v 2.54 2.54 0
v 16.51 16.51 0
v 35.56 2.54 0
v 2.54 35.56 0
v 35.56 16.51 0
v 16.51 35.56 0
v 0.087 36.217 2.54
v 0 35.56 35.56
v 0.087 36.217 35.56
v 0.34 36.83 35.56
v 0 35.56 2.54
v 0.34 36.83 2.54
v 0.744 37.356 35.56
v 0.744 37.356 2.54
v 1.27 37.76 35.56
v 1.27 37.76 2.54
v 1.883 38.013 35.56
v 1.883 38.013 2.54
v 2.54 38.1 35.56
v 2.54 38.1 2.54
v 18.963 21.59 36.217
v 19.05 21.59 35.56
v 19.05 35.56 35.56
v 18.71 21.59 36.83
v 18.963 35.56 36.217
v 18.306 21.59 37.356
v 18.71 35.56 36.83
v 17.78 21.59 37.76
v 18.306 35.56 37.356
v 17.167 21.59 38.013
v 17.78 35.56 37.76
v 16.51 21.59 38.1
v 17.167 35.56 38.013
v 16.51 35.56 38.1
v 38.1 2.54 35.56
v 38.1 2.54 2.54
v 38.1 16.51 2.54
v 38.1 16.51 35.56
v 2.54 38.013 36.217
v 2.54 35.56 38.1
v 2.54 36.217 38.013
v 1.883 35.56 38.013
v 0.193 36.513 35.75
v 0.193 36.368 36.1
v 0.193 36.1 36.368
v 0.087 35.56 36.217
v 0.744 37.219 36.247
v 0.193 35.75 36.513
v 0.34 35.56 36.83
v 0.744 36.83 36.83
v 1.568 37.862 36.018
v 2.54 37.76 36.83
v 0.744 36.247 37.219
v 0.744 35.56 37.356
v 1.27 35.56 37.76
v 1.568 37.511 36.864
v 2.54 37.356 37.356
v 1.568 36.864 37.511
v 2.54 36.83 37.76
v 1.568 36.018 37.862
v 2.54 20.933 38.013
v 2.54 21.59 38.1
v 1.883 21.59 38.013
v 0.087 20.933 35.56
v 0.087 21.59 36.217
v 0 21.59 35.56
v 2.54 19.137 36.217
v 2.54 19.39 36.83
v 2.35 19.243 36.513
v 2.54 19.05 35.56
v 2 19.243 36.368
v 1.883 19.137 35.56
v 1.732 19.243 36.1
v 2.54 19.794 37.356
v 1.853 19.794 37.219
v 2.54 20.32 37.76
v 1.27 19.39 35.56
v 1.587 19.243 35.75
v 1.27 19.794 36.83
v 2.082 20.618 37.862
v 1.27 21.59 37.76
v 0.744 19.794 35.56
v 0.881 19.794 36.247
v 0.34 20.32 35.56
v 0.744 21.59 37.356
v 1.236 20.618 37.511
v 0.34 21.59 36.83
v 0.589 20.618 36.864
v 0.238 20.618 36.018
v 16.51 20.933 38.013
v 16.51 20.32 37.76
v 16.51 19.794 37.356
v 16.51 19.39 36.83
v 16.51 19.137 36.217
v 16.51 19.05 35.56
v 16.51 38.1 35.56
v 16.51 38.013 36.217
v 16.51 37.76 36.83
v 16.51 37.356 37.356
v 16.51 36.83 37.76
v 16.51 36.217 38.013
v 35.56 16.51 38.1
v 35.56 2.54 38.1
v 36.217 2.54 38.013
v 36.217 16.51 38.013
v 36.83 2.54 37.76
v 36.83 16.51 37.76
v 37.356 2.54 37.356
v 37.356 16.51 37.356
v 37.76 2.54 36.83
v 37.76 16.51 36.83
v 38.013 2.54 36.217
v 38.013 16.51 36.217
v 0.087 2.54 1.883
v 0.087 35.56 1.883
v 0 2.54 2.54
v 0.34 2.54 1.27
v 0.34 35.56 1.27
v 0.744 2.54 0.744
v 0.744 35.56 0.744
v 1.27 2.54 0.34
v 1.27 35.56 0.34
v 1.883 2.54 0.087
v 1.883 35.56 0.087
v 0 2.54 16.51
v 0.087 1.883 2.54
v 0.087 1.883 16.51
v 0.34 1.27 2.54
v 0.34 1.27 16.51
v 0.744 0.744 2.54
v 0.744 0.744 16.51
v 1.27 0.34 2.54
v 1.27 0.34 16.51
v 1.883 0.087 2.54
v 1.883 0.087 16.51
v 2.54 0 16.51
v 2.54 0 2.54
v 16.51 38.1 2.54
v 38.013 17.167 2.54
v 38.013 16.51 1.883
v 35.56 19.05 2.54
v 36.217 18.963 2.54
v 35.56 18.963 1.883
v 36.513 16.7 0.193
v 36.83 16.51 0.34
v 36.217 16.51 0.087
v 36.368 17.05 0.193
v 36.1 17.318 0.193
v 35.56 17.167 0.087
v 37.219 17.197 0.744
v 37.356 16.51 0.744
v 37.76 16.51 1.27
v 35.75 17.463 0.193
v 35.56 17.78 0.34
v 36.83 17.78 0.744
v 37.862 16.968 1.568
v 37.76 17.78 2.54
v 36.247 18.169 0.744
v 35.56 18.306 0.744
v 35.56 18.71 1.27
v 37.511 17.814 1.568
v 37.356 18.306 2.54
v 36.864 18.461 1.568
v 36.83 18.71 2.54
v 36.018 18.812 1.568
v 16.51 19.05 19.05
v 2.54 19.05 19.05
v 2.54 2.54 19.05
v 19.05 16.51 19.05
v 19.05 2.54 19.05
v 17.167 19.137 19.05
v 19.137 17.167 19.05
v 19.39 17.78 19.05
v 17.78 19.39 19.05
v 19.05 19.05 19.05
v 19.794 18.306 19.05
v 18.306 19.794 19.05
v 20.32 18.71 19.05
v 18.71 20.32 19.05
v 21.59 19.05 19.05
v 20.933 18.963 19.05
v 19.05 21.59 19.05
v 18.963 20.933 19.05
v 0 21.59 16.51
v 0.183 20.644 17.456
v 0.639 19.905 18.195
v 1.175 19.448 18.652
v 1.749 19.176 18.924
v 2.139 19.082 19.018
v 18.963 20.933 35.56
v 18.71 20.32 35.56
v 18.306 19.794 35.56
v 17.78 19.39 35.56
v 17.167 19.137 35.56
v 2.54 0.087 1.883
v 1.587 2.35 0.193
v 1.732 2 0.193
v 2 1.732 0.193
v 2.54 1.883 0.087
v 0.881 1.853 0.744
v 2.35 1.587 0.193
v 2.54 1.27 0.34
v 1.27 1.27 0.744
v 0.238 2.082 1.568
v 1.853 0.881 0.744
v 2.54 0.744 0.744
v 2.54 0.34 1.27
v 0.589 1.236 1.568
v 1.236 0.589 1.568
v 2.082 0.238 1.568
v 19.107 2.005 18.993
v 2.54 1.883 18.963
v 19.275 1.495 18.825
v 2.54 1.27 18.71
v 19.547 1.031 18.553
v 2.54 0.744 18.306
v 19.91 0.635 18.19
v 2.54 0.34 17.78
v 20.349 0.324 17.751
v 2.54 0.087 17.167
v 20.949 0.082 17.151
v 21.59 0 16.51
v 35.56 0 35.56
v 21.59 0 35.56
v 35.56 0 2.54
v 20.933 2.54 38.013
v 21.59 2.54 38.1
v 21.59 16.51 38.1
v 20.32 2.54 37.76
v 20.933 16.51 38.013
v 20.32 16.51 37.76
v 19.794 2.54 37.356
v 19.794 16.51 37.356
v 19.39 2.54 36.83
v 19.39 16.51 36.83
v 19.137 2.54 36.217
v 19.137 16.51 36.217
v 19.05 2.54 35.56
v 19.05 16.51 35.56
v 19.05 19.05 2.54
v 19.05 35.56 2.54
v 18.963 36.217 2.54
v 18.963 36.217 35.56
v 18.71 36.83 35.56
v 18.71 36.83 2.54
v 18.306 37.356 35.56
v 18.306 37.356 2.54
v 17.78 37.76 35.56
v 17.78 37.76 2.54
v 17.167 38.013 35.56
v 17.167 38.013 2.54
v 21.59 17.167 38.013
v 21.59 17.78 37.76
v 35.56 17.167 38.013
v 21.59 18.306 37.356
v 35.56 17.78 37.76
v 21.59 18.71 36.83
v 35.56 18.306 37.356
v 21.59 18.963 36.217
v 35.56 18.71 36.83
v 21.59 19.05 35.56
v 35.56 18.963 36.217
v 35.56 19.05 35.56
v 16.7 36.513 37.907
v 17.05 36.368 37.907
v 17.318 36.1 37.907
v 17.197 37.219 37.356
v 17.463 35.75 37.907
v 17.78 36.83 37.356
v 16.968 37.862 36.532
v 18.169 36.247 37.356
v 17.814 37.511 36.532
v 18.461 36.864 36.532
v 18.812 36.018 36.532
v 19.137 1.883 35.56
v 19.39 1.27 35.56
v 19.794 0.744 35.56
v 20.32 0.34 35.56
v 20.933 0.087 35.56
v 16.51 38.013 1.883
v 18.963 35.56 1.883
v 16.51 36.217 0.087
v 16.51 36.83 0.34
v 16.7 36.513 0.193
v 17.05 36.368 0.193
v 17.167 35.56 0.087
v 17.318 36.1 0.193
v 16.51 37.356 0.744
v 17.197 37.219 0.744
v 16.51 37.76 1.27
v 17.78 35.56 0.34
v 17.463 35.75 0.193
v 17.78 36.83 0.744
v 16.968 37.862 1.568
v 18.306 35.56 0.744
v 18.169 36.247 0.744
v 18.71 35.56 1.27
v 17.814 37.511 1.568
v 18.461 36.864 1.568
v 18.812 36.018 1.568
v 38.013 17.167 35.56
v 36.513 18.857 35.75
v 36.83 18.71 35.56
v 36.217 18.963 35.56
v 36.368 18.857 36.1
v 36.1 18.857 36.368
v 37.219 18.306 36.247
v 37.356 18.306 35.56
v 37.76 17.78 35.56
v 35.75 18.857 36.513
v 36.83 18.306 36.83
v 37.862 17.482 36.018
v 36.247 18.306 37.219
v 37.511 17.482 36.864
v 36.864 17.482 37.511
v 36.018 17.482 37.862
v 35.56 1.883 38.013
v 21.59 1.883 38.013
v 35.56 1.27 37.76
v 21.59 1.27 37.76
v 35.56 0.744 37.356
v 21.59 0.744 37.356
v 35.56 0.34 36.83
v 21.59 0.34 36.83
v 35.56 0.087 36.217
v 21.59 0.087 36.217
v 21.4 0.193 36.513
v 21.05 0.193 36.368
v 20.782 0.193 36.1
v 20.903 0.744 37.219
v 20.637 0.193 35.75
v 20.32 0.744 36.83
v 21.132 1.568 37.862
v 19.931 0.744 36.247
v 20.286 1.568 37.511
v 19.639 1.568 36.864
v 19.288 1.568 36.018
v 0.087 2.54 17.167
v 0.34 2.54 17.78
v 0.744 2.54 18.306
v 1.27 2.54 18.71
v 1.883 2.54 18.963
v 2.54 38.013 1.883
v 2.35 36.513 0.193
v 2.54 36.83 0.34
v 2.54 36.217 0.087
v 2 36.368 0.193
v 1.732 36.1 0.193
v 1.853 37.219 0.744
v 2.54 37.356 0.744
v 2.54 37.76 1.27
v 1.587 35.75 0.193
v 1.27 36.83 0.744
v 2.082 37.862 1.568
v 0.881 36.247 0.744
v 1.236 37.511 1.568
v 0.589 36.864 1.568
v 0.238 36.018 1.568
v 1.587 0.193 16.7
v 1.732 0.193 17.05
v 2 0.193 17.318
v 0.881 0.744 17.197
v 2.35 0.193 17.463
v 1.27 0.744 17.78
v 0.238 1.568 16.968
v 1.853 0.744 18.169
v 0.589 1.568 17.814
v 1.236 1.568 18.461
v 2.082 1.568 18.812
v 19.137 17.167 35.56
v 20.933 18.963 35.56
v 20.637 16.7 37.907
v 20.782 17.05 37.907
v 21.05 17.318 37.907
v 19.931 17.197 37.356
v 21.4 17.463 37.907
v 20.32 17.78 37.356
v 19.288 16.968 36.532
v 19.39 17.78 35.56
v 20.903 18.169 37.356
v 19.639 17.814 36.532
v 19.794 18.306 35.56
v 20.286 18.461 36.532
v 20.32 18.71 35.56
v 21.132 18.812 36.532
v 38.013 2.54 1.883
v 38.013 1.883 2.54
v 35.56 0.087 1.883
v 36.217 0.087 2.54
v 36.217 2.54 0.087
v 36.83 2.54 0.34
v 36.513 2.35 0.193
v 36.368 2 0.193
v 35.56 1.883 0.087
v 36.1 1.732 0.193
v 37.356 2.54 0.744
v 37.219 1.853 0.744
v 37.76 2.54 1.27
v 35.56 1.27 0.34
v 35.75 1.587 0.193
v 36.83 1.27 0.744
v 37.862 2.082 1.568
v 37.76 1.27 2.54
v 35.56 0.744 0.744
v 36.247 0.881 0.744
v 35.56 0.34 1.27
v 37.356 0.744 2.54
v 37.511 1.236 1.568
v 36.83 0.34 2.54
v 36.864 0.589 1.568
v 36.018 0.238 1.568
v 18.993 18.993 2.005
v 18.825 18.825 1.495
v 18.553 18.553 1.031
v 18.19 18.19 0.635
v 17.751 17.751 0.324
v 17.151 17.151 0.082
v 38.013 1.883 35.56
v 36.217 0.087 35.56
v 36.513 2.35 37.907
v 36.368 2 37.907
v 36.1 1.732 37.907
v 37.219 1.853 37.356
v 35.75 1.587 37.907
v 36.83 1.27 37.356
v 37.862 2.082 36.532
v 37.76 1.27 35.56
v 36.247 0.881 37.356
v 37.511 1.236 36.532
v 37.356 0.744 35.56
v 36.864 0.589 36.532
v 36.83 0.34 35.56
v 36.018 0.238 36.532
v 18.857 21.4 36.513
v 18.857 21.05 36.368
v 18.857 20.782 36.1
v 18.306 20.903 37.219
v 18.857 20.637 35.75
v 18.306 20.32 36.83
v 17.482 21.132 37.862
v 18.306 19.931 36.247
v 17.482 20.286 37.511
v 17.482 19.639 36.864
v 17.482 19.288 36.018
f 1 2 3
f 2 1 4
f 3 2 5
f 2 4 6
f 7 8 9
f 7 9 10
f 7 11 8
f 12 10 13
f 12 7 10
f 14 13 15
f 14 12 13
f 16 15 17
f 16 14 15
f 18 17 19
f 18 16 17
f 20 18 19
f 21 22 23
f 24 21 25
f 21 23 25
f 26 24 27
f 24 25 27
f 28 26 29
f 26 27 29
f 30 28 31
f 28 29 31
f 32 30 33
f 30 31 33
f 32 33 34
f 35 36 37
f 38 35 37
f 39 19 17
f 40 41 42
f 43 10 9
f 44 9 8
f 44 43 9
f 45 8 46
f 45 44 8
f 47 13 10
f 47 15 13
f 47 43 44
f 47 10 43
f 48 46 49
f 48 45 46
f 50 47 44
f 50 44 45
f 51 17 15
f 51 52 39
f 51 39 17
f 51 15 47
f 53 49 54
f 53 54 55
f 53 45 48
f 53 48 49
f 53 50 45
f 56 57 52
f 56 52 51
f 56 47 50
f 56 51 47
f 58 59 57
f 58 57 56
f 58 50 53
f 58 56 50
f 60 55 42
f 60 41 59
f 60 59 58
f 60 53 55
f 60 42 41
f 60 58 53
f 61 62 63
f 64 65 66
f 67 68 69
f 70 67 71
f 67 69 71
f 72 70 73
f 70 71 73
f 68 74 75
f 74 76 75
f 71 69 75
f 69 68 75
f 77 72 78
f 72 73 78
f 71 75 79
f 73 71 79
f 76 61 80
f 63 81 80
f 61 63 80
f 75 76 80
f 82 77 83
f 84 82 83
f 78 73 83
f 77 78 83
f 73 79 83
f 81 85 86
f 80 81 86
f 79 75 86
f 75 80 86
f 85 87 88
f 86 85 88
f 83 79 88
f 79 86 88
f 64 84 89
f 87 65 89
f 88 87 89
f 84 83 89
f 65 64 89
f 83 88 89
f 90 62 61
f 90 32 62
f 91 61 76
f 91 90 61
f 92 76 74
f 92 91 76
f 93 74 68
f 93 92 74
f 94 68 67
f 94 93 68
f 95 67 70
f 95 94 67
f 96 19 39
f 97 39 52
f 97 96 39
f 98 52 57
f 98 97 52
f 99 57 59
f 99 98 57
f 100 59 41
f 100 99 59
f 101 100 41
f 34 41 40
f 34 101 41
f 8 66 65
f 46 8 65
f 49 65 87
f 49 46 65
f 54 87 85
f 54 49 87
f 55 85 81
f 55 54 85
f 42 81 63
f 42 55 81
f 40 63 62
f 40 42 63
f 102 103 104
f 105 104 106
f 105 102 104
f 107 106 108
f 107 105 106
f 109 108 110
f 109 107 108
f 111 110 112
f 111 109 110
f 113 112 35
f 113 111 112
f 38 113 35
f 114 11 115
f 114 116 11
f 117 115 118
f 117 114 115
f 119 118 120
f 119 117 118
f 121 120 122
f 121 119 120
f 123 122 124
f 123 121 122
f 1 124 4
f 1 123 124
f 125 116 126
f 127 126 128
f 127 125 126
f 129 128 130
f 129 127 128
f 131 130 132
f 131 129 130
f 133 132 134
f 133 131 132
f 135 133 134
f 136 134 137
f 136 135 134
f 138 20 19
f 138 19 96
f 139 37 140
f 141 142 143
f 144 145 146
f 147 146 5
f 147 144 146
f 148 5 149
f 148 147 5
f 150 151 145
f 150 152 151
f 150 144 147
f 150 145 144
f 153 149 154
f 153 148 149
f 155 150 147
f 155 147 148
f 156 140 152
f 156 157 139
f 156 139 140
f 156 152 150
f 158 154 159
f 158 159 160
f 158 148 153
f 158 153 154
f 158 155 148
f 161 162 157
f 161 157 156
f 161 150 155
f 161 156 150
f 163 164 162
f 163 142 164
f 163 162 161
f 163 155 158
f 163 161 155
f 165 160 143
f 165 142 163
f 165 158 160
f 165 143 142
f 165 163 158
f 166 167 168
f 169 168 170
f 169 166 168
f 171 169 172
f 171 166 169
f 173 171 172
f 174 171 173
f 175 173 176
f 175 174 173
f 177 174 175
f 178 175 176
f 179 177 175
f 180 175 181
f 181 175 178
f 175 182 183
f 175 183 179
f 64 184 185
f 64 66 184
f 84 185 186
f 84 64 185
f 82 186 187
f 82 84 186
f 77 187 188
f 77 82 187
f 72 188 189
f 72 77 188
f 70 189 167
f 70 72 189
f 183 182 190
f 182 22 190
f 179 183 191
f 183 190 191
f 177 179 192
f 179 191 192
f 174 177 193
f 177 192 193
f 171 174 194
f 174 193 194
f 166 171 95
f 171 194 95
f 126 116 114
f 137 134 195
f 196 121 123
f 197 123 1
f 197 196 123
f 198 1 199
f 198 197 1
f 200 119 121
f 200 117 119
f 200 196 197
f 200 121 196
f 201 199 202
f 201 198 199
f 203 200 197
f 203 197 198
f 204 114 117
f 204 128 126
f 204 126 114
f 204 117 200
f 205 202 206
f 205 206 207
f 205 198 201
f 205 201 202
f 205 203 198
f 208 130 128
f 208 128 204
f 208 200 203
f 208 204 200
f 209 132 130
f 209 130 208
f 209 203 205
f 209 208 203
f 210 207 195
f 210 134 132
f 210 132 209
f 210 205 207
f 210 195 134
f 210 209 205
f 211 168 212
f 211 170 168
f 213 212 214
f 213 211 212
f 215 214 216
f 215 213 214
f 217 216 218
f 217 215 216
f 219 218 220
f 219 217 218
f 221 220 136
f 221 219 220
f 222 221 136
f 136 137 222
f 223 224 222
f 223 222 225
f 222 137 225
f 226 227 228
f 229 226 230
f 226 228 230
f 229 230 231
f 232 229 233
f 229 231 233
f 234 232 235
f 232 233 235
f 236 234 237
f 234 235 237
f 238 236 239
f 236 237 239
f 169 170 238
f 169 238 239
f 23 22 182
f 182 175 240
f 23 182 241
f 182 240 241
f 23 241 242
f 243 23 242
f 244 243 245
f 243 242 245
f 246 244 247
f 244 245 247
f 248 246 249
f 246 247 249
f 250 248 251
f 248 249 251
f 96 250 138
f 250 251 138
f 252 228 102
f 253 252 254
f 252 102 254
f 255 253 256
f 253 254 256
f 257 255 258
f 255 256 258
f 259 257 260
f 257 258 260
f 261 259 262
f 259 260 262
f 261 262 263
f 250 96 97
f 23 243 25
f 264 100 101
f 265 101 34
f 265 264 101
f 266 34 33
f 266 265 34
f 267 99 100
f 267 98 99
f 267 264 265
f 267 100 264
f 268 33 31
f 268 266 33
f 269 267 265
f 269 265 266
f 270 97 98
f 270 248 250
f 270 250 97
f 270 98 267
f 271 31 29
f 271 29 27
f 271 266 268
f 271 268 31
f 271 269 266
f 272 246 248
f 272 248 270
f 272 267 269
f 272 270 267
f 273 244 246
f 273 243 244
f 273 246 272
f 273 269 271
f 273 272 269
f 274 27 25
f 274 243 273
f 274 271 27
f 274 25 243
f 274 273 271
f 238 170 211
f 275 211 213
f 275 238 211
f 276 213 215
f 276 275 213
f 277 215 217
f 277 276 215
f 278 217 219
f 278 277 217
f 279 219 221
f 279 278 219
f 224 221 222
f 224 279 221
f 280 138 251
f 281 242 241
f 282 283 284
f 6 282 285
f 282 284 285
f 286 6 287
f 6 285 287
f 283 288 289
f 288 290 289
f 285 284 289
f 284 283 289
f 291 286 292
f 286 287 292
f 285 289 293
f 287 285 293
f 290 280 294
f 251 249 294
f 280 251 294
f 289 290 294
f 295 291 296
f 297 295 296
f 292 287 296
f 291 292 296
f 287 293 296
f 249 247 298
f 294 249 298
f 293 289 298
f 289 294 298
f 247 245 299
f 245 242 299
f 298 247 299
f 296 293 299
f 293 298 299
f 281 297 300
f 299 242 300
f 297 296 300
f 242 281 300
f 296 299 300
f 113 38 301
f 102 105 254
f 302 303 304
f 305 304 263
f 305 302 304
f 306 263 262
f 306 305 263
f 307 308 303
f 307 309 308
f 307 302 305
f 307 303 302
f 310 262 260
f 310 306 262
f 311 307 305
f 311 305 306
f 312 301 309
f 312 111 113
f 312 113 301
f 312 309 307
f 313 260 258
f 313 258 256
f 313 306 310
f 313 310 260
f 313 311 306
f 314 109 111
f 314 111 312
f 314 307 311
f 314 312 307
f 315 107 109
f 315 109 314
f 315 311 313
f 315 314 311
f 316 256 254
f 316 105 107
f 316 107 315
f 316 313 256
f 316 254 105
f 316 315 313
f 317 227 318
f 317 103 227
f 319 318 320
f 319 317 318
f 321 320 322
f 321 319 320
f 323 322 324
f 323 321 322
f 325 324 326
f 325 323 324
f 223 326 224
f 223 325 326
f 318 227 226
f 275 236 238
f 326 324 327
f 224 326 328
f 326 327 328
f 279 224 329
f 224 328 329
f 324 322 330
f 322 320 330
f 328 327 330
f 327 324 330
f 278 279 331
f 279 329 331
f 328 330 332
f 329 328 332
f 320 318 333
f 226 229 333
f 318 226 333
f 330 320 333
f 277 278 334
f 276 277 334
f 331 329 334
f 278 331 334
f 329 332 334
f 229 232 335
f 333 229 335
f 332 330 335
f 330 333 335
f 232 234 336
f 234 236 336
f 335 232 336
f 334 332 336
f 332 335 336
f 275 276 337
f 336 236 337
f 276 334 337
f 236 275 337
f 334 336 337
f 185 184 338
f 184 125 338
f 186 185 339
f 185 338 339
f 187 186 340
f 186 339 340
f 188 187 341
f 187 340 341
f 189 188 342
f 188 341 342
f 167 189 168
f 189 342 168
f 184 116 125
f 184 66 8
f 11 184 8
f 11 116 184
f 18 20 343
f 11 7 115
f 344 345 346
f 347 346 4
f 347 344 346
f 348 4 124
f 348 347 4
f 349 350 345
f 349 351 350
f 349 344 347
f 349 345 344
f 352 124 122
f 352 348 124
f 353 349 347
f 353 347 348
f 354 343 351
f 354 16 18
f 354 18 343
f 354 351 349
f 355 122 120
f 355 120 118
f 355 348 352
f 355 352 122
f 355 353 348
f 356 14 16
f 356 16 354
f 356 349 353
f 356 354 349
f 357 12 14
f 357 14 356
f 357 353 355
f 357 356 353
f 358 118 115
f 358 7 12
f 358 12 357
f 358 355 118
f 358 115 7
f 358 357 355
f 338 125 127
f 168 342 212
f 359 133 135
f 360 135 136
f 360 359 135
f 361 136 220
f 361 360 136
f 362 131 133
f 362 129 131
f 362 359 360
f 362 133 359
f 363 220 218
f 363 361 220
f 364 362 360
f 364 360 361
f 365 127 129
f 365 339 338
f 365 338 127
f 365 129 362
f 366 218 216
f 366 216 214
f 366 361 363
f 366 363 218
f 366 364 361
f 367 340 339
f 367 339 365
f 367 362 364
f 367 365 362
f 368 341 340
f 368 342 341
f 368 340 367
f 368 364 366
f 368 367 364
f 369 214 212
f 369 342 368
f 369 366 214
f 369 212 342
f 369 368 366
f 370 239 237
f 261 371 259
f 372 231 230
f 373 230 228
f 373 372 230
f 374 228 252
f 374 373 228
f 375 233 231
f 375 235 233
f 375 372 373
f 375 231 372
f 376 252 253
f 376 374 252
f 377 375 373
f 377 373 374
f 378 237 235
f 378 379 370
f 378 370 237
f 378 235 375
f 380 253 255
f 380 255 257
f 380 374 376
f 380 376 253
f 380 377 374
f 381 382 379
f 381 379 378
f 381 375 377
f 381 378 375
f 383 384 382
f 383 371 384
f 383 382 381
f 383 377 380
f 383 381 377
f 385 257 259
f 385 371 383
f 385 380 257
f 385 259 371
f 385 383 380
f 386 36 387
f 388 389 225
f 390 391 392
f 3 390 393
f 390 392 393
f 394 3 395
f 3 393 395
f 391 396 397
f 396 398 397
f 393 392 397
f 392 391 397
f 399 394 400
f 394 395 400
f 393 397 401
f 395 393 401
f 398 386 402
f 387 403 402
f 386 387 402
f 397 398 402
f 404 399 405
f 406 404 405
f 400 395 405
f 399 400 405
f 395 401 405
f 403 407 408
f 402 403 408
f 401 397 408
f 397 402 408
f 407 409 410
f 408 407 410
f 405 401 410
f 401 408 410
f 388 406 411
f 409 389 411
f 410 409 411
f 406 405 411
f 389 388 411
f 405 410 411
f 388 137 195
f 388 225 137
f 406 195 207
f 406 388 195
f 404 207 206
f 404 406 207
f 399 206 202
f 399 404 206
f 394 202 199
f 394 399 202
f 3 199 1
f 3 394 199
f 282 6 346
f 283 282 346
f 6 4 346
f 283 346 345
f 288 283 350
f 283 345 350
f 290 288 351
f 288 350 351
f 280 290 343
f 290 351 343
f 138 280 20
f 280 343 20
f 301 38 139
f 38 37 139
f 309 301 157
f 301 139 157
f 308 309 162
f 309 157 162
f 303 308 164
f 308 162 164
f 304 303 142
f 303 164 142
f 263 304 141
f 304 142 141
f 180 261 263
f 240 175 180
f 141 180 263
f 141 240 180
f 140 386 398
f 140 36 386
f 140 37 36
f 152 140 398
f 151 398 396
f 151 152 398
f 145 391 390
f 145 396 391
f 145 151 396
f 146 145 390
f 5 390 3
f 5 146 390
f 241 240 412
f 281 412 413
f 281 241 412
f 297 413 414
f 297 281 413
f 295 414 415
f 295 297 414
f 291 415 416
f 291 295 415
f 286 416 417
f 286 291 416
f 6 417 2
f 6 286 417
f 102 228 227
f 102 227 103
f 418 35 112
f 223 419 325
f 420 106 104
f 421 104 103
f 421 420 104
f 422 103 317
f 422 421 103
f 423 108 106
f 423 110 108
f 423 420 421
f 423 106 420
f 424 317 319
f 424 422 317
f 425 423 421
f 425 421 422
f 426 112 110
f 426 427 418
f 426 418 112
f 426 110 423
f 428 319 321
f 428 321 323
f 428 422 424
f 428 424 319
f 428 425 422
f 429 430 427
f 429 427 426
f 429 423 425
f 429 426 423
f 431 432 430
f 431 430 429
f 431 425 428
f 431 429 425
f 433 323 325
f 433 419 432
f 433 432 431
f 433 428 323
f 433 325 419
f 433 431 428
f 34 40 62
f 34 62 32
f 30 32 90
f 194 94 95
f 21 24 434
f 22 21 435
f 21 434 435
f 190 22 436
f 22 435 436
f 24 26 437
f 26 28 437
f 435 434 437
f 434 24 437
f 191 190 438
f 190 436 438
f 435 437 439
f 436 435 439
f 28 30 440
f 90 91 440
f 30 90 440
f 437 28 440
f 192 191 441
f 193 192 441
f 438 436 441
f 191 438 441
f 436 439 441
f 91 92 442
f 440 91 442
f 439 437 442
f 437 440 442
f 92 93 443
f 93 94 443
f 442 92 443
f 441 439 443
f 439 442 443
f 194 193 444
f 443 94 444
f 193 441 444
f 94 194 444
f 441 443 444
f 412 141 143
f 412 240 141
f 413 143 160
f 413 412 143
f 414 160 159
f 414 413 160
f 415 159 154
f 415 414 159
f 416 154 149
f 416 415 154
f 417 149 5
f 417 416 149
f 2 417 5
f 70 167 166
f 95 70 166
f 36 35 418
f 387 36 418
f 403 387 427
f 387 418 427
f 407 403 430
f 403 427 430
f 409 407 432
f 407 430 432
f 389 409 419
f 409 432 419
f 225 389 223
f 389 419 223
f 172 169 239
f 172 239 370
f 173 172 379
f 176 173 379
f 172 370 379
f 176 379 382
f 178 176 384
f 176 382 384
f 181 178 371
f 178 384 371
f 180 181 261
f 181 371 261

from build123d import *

# Parameters (mm, degrees)
F1_DEPTH = 19.05
F2_W     = 19.05
F2_H     = 19.05
F3_DEPTH = 19.05
F4_R     = 2.54
F5_DEPTH = 19.05
F6_R     = 2.54


with BuildPart() as f1:
    # F0 (on Top) → F1 (new body)
    with BuildSketch(Plane.XY):
        Polygon((0, 38.1), (0, 0), (38.1, 0), (38.1, 19.05), (19.05, 19.05), (19.05, 38.1), align=None)
    extrude(amount=F1_DEPTH)

    # F2 (on face) → F3 (join)
    with BuildSketch(Plane.XY.offset(19.05)):
        with Locations((28.575, 9.525)):
            Rectangle(F2_W, F2_H)
    extrude(amount=F3_DEPTH)

    # F4
    f4_edges = [f1.edges().sort_by_distance(p)[0] for p in [
        (19.05, 19.05, 28.575),
    ]]
    fillet(f4_edges, radius=F4_R)

    # F2 (on face) → F5 (join)
    with BuildSketch(Plane.XY.offset(19.05)):
        with Locations((9.525, 28.575)):
            Rectangle(F2_W, F2_H)
    extrude(amount=F5_DEPTH)

    # F6
    f6_edges = [f1.edges().sort_by_distance(p)[0] for p in [
        (38.1, 0, 19.05),
        (38.1, 9.525, 38.1),
        (38.1, 19.05, 19.05),
        (38.1, 9.525, 0),
        (19.05, 38.1, 19.05),
        (9.525, 38.1, 38.1),
        (0, 38.1, 19.05),
        (9.525, 38.1, 0),
        (0, 28.575, 38.1),
        (9.525, 19.05, 38.1),
        (19.05, 28.575, 38.1),
        (29.845, 19.05, 38.1),
        (19.793949, 18.306051, 38.1),
        (19.05, 8.255, 38.1),
        (28.575, 0, 38.1),
        (0, 19.05, 28.575),
        (0, 9.525, 19.05),
        (0, 0, 9.525),
        (0, 19.05, 0),
        (9.525, 0, 19.05),
        (19.05, 0, 28.575),
        (19.05, 0, 0),
        (28.575, 19.05, 0),
        (19.05, 28.575, 0),
        (19.05, 19.05, 28.575),
    ]]
    fillet(f6_edges, radius=F6_R)


solid = f1.part
